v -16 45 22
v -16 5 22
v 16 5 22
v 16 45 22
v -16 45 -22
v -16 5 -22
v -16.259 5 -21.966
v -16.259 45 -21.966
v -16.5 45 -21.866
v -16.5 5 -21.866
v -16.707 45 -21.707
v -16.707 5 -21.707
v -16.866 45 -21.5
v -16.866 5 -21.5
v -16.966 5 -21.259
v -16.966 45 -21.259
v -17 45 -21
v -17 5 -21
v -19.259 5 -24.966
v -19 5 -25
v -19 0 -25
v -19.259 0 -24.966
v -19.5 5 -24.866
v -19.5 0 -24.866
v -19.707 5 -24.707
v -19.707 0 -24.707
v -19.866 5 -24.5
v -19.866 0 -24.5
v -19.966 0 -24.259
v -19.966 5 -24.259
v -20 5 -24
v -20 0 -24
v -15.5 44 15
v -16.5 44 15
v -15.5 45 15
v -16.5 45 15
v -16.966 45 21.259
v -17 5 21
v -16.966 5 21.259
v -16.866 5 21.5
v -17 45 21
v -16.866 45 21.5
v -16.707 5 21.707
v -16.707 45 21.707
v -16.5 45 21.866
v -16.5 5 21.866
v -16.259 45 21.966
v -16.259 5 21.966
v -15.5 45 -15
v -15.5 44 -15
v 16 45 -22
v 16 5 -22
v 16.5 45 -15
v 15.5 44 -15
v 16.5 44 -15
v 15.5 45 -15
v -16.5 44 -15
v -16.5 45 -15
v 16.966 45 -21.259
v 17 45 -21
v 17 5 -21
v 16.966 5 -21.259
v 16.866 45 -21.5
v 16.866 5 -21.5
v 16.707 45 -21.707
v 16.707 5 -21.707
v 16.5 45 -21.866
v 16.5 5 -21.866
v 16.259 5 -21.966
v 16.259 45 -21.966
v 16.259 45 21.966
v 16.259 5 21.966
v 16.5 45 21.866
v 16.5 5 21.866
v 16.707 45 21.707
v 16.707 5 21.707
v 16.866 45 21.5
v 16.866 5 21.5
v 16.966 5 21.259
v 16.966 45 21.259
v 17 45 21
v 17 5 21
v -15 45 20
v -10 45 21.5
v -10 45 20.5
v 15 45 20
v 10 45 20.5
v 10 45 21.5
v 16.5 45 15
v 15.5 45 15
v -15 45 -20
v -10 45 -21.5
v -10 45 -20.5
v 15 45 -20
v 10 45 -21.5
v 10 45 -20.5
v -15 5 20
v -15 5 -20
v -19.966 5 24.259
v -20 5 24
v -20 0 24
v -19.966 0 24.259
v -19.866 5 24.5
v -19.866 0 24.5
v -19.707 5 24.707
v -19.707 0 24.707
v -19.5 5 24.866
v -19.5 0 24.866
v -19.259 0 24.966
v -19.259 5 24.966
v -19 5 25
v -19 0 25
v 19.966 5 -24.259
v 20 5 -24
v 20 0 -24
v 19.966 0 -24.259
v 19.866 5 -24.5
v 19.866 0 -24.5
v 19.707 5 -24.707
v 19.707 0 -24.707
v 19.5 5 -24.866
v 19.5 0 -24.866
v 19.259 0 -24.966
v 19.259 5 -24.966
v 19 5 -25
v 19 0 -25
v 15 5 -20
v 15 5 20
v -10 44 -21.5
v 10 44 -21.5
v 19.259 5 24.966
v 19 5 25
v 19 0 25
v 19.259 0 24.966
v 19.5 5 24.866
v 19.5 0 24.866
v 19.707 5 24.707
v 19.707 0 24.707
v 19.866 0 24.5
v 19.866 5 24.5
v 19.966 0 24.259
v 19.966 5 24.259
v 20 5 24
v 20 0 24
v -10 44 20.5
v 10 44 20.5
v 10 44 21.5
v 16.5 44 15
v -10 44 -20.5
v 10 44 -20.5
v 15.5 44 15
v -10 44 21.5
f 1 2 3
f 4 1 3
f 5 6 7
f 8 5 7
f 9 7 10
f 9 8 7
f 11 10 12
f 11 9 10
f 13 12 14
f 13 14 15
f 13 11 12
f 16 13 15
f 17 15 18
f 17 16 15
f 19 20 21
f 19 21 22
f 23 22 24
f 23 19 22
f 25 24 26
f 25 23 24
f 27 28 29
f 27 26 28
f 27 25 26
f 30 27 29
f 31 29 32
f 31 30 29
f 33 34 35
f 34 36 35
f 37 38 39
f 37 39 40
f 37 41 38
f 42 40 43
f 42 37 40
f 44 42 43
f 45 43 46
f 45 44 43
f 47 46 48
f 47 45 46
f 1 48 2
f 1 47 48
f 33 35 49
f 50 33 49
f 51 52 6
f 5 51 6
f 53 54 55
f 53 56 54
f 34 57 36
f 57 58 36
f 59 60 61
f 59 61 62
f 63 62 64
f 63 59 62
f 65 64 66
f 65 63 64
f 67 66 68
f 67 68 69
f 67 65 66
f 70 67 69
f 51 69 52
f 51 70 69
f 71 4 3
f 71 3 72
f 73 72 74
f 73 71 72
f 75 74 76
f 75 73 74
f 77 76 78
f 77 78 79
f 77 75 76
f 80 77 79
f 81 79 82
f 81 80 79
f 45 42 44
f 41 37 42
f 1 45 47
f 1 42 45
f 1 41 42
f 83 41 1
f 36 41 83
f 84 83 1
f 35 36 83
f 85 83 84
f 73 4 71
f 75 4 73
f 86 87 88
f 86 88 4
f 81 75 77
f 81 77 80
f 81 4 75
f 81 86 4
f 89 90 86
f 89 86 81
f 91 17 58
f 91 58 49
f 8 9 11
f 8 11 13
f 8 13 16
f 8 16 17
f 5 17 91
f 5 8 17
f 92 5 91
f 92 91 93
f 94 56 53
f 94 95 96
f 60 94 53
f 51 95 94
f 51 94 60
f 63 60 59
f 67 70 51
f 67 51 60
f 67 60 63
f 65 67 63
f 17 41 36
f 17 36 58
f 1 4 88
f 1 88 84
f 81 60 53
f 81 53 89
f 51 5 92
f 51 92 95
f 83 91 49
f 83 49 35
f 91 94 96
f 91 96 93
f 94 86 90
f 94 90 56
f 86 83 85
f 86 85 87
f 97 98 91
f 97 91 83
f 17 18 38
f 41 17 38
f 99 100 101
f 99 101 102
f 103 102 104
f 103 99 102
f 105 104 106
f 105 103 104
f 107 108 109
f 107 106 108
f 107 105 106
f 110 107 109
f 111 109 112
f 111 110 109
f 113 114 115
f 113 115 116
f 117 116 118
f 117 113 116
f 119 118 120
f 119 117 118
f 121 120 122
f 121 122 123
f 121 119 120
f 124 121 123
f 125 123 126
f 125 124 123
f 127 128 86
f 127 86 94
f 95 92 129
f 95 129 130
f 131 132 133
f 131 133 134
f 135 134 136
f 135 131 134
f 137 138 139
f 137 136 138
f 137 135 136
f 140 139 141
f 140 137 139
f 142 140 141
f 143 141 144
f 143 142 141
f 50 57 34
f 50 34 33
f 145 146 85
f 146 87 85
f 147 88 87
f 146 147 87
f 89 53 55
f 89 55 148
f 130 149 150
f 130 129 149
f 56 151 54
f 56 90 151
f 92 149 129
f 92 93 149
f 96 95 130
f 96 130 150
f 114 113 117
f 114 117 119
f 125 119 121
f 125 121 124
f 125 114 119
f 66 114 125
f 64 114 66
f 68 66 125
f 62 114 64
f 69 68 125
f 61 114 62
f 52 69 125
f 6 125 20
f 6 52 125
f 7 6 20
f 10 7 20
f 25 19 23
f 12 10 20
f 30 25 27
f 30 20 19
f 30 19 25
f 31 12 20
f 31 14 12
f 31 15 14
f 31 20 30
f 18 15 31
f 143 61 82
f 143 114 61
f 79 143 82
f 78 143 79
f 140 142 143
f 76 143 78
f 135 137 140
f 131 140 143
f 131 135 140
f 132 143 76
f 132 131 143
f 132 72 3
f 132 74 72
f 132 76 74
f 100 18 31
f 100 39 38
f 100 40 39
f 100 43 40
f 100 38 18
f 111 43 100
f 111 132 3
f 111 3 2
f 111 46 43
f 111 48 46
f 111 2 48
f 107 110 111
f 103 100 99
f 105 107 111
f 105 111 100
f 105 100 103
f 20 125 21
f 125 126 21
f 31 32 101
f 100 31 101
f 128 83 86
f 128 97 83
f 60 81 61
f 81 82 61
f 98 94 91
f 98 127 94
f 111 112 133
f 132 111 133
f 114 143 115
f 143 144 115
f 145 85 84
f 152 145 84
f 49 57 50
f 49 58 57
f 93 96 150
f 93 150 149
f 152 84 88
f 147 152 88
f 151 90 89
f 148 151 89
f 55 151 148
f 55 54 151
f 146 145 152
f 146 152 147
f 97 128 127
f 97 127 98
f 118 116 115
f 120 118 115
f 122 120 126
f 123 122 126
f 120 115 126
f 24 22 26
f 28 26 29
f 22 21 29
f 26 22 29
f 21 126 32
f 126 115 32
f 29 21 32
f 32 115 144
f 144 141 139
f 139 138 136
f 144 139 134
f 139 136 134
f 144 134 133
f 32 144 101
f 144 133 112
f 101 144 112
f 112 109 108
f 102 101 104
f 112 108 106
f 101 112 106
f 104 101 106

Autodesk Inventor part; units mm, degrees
ref_plane "YZ Plane" through (0, 0, 0) normal (1, 0, 0) x (0, 1, 0)
ref_plane "XZ Plane" through (0, 0, 0) normal (0, 1, 0) x (-1, 0, 0)
ref_plane "XY Plane" through (0, 0, 0) normal (0, 0, 1) x (1, 0, 0)
sketch "Sketch1" plane through (0, 0, 0) normal (0, 1, 0) x (-1, 0, 0)
  line L0 (-20, -25) -> (20, -25)
  line L1 (20, -25) -> (20, 25)
  line L2 (20, 25) -> (-20, 25)
  line L3 (-20, 25) -> (-20, -25)
  line L4 (-20, -25) -> (20, 25) construction
  line L5 (20, -25) -> (-20, 25) construction
  point P0 (0, 0)
  dimension "d2" = 40
  dimension "d3" = 50
extrude "Extrusion1" add sketch "Sketch1" along normal blind 5
sketch "Sketch2" plane through (0, 5, 0) normal (0, 1, 0) x (1, 0, 0)
  line L0 (-20, 25) -> (-20, -25) projected
  line L1 (-20, -25) -> (20, -25) projected
  line L2 (20, -25) -> (20, 25) projected
  line L3 (20, 25) -> (-20, 25) projected
  line L4 (17, 22) -> (-17, 22)
  line L5 (-17, 22) -> (-17, -22)
  line L6 (-17, -22) -> (17, -22)
  line L7 (17, -22) -> (17, 22)
  line L8 (17, 22) -> (-17, -22) construction
  line L9 (-17, 22) -> (17, -22) construction
  line L10 (15, 20) -> (-15, 20)
  line L11 (-15, 20) -> (-15, -20)
  line L12 (-15, -20) -> (15, -20)
  line L13 (15, -20) -> (15, 20)
  line L14 (15, 20) -> (-15, -20) construction
  line L15 (-15, 20) -> (15, -20) construction
  point P0 (0, 0)
  dimension "d6" = 3
  dimension "d7" = 2
  dimension "d52" = 3
  dimension "d53" = 2
extrude "Extrusion2" add sketch "Sketch2" along normal blind 40 contours L7 L6 L5 L4
fillet "Fillet1" radius 1 1 edges at (20, 2.5, 25)
fillet "Fillet2" radius 1 1 edges at (20, 2.5, -25)
fillet "Fillet3" radius 1 1 edges at (-20, 2.5, 25)
fillet "Fillet4" radius 1 1 edges at (-20, 2.5, -25)
fillet "Fillet5" radius 1 1 edges at (-17, 25, 22)
fillet "Fillet6" radius 1 1 edges at (17, 25, 22)
fillet "Fillet7" radius 1 1 edges at (17, 25, -22)
fillet "Fillet8" radius 1 1 edges at (-17, 25, -22)
sketch "Sketch3" plane through (0, 45, 0) normal (0, 1, 0) x (1, 0, 0)
  arc A0 (-16, 22) -> (-17, 21) centre (-16, 21) ccw projected
  line L0 (-17, 21) -> (-17, -21) projected
  arc A1 (-17, -21) -> (-16, -22) centre (-16, -21) ccw projected
  line L1 (-16, -22) -> (16, -22) projected
  arc A2 (16, -22) -> (17, -21) centre (16, -21) ccw projected
  line L2 (17, -21) -> (17, 21) projected
  arc A3 (17, 21) -> (16, 22) centre (16, 21) ccw projected
  line L3 (16, 22) -> (-16, 22) projected
  line L4 (15, 20) -> (15, -20) projected
  line L5 (15, -20) -> (-15, -20) projected
  line L6 (-15, -20) -> (-15, 20) projected
  line L7 (-15, 20) -> (15, 20) projected
  line L8 (-16.5, -15) -> (-15.5, -15)
  line L9 (-15.5, -15) -> (-15.5, 5)
  line L10 (-15.5, 5) -> (-16.5, 5)
  line L11 (-16.5, 5) -> (-16.5, -15)
  line L12 (-16.5, 15) -> (-15.5, 15)
  line L13 (-15.5, 15) -> (-15.5, -5)
  line L14 (-15.5, -5) -> (-16.5, -5)
  line L15 (-16.5, -5) -> (-16.5, 15)
  line L16 (-10, 21.5) -> (10, 21.5)
  line L17 (10, 21.5) -> (10, 20.5)
  line L18 (10, 20.5) -> (-10, 20.5)
  line L19 (-10, 20.5) -> (-10, 21.5)
  line L20 (10, 21.5) -> (-10, 21.5)
  line L21 (-10, 21.5) -> (-10, 20.5)
  line L22 (-10, 20.5) -> (10, 20.5)
  line L23 (10, 20.5) -> (10, 21.5)
  line L24 (15.5, 15) -> (16.5, 15)
  line L25 (16.5, 15) -> (16.5, -5)
  line L26 (16.5, -5) -> (15.5, -5)
  line L27 (15.5, -5) -> (15.5, 15)
  line L28 (15.5, -15) -> (16.5, -15)
  line L29 (16.5, -15) -> (16.5, 5)
  line L30 (16.5, 5) -> (15.5, 5)
  line L31 (15.5, 5) -> (15.5, -15)
  line L32 (10, -20.5) -> (-10, -20.5)
  line L33 (-10, -20.5) -> (-10, -21.5)
  line L34 (-10, -21.5) -> (10, -21.5)
  line L35 (10, -21.5) -> (10, -20.5)
  line L36 (-10, -20.5) -> (10, -20.5)
  line L37 (10, -20.5) -> (10, -21.5)
  line L38 (10, -21.5) -> (-10, -21.5)
  line L39 (-10, -21.5) -> (-10, -20.5)
  point P0 (0, 0)
  point P1 (-16, 15)
  point P2 (-16, -5)
  point P3 (16, 15)
  dimension "d18" = 1
  dimension "d19" = 20
  dimension "d20" = 0.5
  dimension "d21" = 7
  dimension "d22" = 7
  dimension "d23" = 0.5
  dimension "d24" = 1
  dimension "d25" = 20
  dimension "d26" = 20
  dimension "d27" = 1
  dimension "d28" = 0.5
  dimension "d29" = 7
  dimension "d30" = 20
  dimension "d31" = 1
  dimension "d32" = 0.5
  dimension "d33" = 7
  dimension "d34" = 1
  dimension "d35" = 20
  dimension "d36" = 0.5
  dimension "d37" = 7
  dimension "d38" = 1
  dimension "d39" = 20
  dimension "d40" = 7
  dimension "d41" = 0.5
  dimension "d42" = 20
  dimension "d43" = 1
  dimension "d44" = 0.5
  dimension "d45" = 7
  dimension "d46" = 20
  dimension "d47" = 1
  dimension "d48" = 0.5
  dimension "d49" = 7
extrude "Extrusion3" cut sketch "Sketch3" against normal blind 1 contours L11 L14 L9 L8 | L11 L10 L9 L14 | L15 L12 L13 L10 | L16 L17 L18 L19 | L24 L25 L30 L27 | L30 L25 L26 L27 | L26 L29 L28 L31 | L35 L34 L33 L32
properties part number "block_main" material "PC/ABS Plastic"
